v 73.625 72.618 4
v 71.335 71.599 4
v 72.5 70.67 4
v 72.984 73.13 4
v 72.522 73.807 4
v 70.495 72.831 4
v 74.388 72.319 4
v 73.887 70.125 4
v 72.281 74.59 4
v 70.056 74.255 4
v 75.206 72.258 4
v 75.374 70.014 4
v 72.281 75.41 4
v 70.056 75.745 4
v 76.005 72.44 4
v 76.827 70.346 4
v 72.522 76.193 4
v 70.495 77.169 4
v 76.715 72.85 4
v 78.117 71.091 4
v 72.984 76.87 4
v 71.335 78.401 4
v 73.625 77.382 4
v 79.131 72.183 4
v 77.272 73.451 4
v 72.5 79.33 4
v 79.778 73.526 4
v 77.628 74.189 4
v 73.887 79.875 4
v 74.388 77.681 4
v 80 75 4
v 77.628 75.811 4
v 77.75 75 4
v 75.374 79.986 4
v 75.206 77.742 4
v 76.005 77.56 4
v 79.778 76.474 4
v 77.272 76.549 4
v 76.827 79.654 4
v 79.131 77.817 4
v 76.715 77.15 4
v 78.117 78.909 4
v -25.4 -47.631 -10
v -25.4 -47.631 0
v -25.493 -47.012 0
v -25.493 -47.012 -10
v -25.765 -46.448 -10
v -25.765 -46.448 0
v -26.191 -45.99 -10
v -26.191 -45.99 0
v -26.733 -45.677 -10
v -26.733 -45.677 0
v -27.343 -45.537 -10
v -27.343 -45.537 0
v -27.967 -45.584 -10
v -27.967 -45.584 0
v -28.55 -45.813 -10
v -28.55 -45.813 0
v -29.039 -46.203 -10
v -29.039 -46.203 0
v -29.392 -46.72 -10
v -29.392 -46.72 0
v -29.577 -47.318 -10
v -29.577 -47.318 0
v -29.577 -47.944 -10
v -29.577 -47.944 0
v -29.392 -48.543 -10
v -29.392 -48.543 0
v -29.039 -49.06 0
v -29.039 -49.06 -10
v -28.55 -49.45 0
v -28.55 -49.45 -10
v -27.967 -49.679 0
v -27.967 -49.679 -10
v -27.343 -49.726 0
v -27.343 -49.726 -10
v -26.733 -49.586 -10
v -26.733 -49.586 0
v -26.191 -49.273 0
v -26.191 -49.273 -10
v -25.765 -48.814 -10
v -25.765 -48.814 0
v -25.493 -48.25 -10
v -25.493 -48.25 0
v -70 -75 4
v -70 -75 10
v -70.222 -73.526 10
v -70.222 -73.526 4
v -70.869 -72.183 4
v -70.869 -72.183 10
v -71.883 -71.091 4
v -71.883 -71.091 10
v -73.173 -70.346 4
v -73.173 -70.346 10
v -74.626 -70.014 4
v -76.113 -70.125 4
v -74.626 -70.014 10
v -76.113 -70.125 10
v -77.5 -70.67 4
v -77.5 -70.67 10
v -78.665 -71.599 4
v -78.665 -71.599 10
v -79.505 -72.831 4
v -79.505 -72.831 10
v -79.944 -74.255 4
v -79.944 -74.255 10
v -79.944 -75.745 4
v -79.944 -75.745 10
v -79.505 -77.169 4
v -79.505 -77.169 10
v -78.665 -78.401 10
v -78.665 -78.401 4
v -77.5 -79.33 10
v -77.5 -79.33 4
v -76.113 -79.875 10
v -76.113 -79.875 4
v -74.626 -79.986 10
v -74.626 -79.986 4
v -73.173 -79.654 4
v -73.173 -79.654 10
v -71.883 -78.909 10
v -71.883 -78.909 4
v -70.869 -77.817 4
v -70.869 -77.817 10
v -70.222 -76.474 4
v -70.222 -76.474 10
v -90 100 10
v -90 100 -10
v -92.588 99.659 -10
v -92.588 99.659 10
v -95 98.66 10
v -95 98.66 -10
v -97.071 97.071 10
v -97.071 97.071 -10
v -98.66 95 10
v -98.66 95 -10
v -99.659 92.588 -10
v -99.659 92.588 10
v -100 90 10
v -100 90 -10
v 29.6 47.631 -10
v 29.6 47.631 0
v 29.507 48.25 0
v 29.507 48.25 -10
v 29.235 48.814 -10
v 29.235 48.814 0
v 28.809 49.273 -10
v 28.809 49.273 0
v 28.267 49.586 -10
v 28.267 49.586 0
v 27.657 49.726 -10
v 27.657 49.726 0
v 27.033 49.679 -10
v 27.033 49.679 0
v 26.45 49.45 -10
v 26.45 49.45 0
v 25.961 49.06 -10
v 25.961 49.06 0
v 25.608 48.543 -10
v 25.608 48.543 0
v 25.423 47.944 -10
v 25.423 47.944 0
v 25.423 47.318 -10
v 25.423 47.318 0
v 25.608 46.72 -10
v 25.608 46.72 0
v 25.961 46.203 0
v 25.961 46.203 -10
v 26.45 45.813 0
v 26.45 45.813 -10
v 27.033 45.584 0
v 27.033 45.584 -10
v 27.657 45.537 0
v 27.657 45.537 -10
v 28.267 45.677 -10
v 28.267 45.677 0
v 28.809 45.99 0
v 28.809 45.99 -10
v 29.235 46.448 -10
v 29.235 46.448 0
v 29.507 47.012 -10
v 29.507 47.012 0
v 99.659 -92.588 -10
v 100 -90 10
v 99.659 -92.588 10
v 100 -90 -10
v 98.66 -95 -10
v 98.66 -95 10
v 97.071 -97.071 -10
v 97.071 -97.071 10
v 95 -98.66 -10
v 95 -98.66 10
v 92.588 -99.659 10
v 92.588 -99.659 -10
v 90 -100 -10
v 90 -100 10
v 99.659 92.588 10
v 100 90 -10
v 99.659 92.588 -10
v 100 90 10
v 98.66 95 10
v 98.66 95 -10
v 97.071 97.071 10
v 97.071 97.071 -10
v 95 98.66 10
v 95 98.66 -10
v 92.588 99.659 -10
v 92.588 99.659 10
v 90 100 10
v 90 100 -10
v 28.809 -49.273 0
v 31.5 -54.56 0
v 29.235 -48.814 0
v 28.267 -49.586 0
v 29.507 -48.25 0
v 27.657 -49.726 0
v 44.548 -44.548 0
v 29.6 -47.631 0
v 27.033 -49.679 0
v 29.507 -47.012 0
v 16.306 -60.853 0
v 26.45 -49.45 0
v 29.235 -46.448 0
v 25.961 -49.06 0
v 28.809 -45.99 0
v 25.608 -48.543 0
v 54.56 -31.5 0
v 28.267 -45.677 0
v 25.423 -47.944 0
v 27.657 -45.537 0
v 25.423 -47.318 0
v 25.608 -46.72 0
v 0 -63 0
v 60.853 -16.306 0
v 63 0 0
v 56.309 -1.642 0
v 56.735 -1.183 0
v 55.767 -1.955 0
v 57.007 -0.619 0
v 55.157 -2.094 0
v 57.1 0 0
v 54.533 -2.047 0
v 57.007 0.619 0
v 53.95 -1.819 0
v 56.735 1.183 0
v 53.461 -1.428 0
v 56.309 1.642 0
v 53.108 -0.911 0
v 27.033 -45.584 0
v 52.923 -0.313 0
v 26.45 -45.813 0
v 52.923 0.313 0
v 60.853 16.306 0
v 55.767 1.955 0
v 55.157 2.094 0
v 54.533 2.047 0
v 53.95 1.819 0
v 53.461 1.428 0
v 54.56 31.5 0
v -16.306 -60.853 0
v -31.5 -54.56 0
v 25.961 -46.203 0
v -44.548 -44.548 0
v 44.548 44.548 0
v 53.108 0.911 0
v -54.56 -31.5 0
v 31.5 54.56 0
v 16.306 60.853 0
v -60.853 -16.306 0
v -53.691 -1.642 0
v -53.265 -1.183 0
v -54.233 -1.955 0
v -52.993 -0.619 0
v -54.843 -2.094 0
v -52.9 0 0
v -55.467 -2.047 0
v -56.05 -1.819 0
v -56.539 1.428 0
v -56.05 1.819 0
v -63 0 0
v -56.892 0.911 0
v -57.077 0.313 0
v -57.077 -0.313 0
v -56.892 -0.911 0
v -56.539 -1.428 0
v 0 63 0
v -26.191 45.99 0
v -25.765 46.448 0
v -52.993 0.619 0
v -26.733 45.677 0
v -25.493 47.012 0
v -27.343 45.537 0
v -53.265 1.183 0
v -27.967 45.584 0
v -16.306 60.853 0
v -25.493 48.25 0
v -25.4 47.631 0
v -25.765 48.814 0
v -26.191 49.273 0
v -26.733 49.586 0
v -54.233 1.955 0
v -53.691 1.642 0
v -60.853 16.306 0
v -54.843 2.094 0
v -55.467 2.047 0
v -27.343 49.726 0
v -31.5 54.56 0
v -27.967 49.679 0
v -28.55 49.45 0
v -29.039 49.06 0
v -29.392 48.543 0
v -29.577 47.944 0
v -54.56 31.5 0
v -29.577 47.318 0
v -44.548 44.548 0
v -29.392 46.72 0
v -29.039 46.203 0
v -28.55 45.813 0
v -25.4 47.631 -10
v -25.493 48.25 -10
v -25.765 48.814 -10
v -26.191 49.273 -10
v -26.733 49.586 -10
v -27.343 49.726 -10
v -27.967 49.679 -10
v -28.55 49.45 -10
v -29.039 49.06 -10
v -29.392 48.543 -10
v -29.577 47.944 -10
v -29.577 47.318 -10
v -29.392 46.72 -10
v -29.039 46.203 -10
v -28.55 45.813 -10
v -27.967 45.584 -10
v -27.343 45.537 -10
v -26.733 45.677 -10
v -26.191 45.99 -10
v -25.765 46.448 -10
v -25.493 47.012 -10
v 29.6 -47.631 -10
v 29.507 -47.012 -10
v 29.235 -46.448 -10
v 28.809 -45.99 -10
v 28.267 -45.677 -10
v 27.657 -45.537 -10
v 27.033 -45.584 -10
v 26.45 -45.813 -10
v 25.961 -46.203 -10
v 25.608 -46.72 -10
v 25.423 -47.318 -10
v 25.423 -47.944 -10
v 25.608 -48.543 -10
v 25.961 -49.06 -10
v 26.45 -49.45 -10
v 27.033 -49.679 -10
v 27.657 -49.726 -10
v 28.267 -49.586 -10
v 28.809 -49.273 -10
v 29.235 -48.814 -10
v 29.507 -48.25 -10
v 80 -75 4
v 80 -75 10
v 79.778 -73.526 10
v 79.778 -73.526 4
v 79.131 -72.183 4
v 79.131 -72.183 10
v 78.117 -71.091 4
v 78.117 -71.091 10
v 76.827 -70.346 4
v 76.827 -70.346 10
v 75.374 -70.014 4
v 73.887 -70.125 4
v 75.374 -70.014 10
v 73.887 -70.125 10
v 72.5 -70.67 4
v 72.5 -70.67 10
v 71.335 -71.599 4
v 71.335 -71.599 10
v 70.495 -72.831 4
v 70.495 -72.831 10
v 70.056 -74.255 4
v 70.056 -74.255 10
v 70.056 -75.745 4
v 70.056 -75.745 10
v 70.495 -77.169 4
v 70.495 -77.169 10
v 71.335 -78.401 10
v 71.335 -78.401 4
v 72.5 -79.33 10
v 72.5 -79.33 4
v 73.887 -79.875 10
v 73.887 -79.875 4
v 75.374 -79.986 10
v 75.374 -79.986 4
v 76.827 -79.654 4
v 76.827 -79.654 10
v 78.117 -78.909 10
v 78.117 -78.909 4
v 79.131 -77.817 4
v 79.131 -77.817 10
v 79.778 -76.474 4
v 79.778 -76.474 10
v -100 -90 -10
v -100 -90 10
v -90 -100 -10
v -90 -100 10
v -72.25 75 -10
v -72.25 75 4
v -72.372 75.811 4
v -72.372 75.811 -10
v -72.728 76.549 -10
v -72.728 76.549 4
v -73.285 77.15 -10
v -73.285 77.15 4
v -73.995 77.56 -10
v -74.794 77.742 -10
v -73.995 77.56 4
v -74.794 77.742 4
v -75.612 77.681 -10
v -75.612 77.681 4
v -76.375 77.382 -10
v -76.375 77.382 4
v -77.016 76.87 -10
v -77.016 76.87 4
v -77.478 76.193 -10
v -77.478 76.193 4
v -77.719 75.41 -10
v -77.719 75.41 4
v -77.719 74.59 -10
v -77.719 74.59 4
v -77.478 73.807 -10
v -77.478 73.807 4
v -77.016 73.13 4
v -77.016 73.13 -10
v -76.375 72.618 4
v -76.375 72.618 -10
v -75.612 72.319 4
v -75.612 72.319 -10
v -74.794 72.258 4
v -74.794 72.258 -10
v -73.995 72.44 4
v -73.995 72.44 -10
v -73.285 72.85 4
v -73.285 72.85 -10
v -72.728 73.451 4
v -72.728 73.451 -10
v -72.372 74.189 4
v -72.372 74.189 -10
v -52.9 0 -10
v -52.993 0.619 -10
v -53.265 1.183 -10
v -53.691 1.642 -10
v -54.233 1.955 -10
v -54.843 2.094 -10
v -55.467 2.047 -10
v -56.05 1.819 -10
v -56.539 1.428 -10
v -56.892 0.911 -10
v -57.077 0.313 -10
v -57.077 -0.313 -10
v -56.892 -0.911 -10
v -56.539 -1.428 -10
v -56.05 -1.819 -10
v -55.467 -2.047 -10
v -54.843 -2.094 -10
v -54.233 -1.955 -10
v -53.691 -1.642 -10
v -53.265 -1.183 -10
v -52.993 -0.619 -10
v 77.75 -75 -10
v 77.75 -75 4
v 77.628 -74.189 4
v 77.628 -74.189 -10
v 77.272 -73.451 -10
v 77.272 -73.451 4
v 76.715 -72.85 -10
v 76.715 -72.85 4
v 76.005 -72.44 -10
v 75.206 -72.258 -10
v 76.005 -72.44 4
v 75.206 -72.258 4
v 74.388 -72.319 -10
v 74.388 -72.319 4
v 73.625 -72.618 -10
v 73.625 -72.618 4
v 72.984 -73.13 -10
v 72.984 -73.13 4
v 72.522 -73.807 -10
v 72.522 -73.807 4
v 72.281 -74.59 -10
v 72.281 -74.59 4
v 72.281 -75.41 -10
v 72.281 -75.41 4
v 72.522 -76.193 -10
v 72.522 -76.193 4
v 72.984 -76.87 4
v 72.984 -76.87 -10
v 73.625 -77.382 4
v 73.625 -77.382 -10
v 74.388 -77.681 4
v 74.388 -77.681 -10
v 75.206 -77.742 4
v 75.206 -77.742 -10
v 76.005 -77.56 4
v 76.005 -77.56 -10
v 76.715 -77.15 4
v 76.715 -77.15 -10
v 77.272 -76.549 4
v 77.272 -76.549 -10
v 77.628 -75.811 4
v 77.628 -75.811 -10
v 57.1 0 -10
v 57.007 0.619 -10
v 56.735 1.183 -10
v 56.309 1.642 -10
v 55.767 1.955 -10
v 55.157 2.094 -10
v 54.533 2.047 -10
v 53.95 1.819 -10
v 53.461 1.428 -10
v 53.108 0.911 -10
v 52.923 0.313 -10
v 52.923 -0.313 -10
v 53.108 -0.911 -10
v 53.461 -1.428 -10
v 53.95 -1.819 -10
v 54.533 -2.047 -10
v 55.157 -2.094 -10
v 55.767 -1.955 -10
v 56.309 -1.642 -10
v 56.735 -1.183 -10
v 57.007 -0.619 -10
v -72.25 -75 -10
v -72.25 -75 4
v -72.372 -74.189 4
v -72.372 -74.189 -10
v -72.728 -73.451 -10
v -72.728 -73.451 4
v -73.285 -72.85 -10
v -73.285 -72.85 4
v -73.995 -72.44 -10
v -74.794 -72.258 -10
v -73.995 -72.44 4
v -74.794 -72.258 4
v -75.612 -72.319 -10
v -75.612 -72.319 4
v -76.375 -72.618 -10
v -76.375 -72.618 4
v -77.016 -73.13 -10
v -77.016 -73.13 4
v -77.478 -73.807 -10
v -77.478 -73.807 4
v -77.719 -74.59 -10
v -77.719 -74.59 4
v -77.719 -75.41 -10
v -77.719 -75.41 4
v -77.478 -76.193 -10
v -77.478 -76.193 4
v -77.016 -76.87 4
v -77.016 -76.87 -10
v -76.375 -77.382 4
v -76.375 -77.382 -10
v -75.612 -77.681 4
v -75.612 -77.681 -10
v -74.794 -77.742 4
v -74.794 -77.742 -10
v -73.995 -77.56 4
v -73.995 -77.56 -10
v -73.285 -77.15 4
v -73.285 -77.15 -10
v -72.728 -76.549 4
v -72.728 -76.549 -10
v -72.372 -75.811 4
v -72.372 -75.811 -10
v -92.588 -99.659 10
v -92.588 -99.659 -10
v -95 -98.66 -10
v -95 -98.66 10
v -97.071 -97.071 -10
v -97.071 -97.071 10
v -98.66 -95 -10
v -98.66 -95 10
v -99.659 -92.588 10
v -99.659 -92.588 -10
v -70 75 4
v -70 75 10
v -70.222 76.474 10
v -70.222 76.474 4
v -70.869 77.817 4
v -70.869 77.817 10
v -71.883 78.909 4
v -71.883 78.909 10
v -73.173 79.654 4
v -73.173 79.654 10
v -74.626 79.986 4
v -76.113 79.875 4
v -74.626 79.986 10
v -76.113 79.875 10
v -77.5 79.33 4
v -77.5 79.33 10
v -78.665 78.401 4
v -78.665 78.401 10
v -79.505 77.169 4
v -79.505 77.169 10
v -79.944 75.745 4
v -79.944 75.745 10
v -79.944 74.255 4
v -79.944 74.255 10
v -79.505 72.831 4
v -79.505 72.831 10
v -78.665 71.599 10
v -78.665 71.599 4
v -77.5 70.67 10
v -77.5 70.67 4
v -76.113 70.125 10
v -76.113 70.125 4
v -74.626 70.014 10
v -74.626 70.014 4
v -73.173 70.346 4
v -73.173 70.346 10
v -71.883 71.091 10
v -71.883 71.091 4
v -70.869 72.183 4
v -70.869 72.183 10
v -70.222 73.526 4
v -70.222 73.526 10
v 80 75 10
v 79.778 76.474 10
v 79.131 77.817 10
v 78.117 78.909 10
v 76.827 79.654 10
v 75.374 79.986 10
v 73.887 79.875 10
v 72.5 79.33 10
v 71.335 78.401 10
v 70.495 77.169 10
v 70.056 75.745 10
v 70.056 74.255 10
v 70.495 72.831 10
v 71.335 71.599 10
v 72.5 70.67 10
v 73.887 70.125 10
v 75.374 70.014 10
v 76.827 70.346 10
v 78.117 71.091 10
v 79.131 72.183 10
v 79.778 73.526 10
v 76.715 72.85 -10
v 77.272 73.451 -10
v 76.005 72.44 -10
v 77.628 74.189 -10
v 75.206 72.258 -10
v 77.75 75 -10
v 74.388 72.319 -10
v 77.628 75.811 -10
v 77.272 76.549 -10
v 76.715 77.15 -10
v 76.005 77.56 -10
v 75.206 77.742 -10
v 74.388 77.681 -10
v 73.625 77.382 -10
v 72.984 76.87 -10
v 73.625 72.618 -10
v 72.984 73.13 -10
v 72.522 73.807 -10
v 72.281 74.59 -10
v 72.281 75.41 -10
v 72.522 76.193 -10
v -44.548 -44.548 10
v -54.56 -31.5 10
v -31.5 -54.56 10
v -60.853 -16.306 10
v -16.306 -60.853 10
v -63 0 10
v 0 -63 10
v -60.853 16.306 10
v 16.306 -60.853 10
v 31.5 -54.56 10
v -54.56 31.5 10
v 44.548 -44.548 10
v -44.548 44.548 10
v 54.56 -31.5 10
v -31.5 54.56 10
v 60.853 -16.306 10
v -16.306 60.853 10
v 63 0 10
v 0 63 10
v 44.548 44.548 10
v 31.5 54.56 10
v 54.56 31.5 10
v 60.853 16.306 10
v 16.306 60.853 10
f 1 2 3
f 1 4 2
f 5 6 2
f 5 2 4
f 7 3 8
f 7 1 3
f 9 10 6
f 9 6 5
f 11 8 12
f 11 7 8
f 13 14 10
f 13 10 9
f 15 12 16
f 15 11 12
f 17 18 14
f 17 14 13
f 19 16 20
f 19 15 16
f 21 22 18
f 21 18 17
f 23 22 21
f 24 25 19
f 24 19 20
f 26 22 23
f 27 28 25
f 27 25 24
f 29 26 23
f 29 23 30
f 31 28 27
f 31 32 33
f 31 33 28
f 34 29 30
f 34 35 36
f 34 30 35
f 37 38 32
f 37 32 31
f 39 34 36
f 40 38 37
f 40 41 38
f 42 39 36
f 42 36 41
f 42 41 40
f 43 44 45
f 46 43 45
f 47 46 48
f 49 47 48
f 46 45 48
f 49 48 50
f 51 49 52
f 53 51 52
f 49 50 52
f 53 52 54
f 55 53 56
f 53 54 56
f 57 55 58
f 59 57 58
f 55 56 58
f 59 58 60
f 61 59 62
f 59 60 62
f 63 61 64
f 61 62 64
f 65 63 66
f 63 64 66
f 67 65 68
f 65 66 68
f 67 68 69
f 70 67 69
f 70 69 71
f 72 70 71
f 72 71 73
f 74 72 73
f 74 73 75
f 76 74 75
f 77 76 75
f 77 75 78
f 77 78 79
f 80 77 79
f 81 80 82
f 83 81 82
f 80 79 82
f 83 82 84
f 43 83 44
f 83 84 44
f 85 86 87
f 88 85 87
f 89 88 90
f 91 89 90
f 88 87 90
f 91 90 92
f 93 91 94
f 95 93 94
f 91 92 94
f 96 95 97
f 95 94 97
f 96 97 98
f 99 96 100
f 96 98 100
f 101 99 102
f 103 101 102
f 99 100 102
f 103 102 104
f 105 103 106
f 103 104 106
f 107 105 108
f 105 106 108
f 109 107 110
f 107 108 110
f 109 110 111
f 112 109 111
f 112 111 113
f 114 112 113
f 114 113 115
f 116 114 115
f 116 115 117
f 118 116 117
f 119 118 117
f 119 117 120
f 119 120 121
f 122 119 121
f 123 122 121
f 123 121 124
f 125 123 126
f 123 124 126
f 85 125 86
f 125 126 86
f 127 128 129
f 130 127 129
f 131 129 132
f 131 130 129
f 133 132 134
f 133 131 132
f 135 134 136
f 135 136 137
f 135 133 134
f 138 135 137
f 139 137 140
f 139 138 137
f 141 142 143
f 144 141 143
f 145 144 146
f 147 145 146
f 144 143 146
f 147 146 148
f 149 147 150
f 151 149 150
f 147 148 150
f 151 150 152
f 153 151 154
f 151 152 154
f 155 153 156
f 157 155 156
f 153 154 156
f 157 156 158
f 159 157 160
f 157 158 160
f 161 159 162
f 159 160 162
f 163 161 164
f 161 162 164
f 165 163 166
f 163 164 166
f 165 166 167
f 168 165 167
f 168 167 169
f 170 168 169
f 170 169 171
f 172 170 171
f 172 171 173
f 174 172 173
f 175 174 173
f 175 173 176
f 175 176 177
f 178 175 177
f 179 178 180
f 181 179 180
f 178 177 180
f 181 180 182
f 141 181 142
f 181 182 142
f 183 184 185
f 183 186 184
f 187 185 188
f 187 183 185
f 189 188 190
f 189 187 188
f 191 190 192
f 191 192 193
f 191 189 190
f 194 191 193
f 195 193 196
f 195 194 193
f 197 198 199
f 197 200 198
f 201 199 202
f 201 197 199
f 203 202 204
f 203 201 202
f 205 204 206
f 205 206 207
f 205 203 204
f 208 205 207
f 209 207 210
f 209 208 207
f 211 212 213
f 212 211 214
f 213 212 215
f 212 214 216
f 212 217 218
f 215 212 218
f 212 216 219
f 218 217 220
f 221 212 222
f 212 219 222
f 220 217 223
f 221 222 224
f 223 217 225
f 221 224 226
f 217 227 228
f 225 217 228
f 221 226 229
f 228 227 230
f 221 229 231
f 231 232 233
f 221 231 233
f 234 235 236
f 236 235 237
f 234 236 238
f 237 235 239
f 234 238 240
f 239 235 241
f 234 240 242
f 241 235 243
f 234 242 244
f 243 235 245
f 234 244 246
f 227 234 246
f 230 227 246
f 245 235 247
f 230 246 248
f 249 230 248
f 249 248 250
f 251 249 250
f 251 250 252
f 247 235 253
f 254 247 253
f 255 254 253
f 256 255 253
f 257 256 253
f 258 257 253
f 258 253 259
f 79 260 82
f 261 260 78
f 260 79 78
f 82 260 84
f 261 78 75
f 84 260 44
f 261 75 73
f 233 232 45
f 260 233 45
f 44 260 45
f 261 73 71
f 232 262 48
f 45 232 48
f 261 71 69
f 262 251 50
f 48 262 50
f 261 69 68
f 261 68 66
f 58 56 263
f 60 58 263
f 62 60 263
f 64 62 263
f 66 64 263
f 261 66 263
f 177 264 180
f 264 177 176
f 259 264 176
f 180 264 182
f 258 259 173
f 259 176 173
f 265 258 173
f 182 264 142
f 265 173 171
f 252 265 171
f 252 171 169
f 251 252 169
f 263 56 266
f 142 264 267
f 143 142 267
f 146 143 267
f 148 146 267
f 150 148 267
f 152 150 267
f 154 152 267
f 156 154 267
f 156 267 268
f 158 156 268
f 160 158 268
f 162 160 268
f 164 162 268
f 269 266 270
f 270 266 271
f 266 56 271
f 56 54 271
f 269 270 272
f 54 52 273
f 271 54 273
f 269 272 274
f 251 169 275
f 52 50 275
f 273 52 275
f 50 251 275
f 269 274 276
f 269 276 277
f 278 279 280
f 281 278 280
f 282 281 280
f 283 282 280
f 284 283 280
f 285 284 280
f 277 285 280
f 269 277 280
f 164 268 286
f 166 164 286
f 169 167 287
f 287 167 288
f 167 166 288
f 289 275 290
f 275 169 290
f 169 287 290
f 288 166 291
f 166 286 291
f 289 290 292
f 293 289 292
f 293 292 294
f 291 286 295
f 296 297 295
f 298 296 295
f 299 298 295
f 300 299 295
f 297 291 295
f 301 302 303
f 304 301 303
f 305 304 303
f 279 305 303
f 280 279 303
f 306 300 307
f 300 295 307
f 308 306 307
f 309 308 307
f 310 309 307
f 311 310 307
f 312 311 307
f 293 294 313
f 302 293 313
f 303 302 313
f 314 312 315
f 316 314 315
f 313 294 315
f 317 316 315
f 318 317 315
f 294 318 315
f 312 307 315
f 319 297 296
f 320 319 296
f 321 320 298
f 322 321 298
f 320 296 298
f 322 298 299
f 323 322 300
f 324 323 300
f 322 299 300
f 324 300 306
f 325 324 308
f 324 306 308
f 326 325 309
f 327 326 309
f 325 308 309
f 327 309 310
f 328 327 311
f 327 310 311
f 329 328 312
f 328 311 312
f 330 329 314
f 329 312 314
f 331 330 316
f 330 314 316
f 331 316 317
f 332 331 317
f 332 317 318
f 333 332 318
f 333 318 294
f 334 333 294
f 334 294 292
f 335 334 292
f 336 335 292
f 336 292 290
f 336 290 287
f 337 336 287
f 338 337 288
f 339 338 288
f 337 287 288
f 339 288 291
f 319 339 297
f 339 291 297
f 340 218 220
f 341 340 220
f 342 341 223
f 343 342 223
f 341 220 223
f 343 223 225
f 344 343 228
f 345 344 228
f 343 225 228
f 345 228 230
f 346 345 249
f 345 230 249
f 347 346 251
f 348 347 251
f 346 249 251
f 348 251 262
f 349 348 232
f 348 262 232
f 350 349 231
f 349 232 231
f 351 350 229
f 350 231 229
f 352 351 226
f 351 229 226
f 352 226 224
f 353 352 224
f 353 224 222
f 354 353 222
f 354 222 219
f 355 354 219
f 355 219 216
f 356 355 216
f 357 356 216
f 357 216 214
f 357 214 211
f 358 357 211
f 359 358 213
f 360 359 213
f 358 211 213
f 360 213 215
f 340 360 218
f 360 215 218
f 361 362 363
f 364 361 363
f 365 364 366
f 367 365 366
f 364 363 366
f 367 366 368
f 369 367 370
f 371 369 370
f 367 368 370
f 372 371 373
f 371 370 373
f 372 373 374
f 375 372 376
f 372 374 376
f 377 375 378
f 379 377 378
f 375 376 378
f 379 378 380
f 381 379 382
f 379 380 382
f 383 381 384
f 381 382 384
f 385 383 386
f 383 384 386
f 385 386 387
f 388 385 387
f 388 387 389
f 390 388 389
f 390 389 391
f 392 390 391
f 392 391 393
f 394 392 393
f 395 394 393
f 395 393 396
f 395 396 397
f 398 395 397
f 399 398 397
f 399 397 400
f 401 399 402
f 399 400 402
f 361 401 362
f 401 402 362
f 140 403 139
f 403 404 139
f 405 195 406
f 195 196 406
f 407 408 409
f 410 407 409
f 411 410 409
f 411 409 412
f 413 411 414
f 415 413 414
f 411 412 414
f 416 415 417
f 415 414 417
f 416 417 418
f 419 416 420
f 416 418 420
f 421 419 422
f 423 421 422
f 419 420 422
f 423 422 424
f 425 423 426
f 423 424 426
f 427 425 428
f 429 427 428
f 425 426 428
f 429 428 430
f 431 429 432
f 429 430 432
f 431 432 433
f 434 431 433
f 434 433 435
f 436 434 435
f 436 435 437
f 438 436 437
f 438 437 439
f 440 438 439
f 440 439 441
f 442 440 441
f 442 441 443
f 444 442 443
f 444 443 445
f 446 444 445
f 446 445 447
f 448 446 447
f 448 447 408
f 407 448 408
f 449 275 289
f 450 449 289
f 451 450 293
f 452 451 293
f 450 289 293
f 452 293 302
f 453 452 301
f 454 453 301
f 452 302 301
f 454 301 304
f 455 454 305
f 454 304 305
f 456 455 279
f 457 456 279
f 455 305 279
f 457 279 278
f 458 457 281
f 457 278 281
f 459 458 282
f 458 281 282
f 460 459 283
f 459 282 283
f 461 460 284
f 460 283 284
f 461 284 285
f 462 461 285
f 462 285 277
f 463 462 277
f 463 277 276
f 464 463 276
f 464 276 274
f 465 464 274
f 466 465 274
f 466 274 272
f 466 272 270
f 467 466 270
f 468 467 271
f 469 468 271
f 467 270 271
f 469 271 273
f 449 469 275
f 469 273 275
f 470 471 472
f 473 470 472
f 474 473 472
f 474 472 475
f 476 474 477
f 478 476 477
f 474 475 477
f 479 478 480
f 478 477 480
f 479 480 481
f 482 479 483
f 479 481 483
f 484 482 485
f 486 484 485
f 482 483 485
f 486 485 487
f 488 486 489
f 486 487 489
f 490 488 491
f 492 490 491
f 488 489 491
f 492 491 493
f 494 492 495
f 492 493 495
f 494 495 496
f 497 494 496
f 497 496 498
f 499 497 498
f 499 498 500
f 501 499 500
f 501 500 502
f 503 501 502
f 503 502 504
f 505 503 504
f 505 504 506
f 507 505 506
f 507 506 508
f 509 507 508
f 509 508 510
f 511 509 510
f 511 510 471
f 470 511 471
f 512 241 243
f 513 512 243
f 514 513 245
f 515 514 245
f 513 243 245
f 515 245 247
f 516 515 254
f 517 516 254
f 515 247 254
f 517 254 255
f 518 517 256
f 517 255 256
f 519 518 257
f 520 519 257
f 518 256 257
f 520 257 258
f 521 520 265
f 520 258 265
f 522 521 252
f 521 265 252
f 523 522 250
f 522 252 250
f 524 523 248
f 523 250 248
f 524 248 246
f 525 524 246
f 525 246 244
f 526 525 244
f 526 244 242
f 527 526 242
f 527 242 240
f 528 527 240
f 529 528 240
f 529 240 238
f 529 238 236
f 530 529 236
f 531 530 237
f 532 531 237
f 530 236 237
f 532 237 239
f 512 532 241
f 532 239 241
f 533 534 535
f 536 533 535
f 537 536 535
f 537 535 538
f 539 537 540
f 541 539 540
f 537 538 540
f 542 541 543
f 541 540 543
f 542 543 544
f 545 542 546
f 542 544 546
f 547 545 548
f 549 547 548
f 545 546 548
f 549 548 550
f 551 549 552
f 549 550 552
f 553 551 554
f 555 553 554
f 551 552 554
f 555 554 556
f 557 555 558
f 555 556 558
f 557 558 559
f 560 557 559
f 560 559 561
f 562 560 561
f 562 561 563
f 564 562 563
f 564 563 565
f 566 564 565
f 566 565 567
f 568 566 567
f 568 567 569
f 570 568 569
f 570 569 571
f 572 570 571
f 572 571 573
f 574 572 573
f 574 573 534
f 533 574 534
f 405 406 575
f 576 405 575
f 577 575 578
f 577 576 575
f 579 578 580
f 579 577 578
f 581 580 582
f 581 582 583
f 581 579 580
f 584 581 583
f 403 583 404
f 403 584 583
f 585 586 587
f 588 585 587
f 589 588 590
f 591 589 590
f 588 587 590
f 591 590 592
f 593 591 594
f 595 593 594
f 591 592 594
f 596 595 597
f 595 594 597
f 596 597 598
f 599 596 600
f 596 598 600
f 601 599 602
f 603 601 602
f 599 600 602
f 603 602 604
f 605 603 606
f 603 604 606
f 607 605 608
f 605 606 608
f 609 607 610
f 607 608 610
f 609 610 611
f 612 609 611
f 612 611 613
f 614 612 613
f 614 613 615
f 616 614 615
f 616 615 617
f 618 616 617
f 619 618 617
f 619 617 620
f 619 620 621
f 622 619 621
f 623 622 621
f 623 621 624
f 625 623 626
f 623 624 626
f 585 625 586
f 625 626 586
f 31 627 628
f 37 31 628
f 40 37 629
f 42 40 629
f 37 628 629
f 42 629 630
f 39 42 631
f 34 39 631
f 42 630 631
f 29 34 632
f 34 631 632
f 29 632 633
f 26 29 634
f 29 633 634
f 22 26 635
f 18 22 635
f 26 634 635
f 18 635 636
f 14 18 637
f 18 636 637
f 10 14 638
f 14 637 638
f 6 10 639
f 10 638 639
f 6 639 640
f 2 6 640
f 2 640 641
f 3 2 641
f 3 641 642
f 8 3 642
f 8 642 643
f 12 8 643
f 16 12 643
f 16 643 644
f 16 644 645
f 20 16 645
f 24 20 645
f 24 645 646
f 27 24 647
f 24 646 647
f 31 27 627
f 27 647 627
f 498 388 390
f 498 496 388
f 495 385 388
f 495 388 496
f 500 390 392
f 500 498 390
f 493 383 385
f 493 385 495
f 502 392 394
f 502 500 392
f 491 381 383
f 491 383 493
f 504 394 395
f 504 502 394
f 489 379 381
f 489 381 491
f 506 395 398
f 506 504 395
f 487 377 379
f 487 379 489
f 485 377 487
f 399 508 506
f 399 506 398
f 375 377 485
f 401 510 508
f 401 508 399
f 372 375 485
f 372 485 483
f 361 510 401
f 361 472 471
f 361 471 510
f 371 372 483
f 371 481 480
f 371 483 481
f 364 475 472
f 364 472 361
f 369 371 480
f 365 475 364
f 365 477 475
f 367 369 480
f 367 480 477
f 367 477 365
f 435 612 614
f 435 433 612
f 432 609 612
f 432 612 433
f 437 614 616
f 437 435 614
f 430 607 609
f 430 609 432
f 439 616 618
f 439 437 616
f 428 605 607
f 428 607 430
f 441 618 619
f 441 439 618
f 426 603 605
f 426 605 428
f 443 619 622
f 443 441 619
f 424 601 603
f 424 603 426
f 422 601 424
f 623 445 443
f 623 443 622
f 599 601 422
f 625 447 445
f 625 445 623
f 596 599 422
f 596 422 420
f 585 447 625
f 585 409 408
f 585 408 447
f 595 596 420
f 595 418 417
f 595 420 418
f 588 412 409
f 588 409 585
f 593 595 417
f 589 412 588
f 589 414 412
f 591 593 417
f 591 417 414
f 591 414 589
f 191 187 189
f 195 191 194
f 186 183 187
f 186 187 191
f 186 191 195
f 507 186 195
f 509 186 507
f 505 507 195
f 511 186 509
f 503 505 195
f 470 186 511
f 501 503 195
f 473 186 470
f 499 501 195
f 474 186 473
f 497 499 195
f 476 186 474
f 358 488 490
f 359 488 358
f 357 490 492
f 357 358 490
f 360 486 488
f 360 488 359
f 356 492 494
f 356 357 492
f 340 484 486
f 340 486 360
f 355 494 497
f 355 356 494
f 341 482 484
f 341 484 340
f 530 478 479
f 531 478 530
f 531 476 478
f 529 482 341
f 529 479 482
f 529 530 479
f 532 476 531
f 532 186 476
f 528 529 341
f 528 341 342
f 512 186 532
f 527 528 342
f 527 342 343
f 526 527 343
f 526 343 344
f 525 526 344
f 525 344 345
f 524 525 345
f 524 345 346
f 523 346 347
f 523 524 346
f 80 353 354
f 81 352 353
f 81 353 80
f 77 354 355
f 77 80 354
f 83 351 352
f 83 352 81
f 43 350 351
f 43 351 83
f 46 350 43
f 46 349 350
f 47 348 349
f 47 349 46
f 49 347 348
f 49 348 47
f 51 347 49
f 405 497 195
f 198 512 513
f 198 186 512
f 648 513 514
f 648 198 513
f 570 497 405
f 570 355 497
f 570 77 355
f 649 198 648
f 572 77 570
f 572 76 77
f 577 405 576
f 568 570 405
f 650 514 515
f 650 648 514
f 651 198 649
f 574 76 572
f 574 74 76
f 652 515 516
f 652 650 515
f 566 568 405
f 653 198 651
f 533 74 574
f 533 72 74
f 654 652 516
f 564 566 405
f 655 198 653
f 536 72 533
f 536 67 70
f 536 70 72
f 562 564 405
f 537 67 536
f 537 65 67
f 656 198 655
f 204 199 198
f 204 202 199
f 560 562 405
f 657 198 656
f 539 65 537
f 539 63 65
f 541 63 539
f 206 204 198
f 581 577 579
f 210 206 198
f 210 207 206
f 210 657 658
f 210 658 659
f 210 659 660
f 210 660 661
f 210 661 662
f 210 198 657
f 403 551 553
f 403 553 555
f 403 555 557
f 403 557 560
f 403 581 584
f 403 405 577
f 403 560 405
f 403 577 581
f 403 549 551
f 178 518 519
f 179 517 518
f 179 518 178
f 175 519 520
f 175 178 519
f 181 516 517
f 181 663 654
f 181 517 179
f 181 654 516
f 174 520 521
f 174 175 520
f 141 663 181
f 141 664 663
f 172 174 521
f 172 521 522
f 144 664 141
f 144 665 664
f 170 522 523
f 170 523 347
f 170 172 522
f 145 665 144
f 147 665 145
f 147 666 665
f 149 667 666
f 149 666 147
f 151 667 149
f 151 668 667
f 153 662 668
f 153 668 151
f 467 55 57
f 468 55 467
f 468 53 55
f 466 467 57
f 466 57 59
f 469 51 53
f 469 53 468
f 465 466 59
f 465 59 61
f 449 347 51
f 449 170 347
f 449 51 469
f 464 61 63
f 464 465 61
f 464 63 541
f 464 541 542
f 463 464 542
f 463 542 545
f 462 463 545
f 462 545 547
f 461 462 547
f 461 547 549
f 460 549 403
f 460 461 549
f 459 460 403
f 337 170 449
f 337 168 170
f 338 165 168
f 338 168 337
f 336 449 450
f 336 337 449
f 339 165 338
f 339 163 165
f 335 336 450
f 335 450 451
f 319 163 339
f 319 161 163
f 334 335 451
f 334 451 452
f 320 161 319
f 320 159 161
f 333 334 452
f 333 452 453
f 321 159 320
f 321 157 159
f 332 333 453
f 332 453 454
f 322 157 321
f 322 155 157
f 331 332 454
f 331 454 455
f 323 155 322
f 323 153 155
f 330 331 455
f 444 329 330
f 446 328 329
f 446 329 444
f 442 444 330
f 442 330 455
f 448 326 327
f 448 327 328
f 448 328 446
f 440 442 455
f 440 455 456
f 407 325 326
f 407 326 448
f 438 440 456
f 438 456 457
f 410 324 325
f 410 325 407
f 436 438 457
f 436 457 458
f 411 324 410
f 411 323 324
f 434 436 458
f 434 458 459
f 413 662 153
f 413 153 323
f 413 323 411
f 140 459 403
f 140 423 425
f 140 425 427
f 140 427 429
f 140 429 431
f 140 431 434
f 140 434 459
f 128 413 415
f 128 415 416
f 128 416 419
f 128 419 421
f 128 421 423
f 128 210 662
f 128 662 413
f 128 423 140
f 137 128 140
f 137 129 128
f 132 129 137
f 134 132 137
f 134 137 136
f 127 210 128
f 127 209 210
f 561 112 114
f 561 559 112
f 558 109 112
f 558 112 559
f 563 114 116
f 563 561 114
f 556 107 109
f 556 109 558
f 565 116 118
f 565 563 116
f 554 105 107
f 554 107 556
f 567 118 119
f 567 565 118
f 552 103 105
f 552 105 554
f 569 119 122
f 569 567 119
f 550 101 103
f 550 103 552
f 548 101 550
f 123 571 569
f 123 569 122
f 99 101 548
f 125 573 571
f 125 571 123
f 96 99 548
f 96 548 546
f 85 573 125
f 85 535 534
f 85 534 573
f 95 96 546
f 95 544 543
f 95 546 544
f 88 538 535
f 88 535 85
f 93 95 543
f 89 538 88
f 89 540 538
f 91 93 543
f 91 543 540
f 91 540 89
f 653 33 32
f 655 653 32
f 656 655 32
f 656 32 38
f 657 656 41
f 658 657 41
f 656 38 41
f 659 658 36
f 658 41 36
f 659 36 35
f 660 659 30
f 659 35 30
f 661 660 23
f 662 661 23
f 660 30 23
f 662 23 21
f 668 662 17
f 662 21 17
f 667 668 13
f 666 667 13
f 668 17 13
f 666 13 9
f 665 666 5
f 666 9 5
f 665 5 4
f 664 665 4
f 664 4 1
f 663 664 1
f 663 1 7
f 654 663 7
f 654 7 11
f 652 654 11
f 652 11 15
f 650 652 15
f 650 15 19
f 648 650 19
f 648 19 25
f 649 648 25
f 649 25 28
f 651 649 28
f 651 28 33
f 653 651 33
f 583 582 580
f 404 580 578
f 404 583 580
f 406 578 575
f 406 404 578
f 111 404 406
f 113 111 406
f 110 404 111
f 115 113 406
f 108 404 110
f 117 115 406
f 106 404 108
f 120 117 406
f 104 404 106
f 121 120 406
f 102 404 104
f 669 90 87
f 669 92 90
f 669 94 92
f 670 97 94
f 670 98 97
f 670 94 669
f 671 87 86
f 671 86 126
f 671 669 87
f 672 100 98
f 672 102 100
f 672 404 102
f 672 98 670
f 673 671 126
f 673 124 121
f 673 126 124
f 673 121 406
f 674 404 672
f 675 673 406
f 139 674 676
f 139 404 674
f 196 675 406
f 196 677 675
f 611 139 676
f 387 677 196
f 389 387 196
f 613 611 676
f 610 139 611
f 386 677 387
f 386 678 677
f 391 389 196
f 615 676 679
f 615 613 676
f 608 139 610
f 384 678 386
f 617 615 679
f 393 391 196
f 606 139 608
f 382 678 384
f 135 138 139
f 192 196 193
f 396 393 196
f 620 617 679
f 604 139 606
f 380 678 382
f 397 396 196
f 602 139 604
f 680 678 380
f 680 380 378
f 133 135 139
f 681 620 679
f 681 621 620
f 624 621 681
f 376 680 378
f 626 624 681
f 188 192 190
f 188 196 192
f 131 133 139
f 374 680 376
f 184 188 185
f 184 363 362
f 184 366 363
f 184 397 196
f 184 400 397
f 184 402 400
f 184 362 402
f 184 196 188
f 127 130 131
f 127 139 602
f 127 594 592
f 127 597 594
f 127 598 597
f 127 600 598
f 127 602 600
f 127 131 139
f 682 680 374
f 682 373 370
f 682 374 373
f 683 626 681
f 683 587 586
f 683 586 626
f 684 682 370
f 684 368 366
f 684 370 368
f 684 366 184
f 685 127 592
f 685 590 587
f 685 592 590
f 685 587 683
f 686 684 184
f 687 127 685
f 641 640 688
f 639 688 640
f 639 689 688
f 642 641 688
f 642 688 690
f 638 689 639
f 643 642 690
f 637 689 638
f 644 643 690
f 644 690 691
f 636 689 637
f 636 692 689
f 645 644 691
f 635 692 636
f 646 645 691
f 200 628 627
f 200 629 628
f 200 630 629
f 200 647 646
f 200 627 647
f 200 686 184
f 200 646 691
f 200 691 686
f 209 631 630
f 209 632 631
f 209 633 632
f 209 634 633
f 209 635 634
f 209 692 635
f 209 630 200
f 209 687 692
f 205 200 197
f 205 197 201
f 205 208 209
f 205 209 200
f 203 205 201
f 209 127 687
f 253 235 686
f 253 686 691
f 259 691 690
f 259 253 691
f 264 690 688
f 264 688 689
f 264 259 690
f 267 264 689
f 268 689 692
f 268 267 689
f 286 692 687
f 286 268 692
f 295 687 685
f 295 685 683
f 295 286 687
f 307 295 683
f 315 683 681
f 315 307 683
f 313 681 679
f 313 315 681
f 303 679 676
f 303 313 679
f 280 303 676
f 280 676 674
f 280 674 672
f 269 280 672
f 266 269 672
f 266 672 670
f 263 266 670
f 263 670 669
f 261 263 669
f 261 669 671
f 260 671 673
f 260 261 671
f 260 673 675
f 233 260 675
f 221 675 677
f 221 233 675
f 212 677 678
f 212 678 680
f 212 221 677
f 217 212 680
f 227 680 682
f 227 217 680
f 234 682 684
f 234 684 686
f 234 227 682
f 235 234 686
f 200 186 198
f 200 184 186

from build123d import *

# Parameters (mm, degrees)
SKETCH_1_W          = 200
SKETCH_1_H          = 200
SKETCH_1_R          = 63
EXTRUDE_1_DEPTH     = 10
SKETCH_2_W          = 200
SKETCH_2_H          = 200
EXTRUDE_2_DEPTH     = 10
SKETCH_3_R          = 2.1
CUT_EXTRUDE_1_DEPTH = 10
SKETCH_4_R          = 2.75
CUT_EXTRUDE_2_DEPTH = 143.828568571
SKETCH_5_R          = 5
CUT_EXTRUDE_3_DEPTH = 6
FILLET_1_R          = 10


with BuildPart() as part:
    # ｽｹｯﾁ1 → ﾎﾞｽ - 押し出し1 (new body)
    with BuildSketch(Plane.XY):
        Rectangle(SKETCH_1_W, SKETCH_1_H)
        Circle(SKETCH_1_R, mode=Mode.SUBTRACT)
    extrude(amount=EXTRUDE_1_DEPTH)

    # ｽｹｯﾁ2 → ﾎﾞｽ - 押し出し2 (add)
    with BuildSketch(Plane(origin=(0, 0, 0), x_dir=(-1, 0, 0), z_dir=(0, 0, -1))):
        Rectangle(SKETCH_2_W, SKETCH_2_H)
    extrude(amount=EXTRUDE_2_DEPTH)

    # ｽｹｯﾁ3 → ｶｯﾄ - 押し出し1 (cut)
    with BuildSketch(Plane.XY):
        with Locations((27.5, -47.631397208)):
            Circle(SKETCH_3_R)
        with Locations((-27.5, -47.631397208)):
            Circle(SKETCH_3_R)
        with Locations((-55, 0)):
            Circle(SKETCH_3_R)
        with Locations((-27.5, 47.631397208)):
            Circle(SKETCH_3_R)
        with Locations((27.5, 47.631397208)):
            Circle(SKETCH_3_R)
        with Locations((55, 0)):
            Circle(SKETCH_3_R)
    extrude(amount=-CUT_EXTRUDE_1_DEPTH, mode=Mode.SUBTRACT)

    # ｽｹｯﾁ4 → ｶｯﾄ - 押し出し2 (cut, through all)
    with BuildSketch(Plane.XY.offset(10)):
        with Locations((75, 75)):
            Circle(SKETCH_4_R)
        with Locations((75, -75)):
            Circle(SKETCH_4_R)
        with Locations((-75, -75)):
            Circle(SKETCH_4_R)
        with Locations((-75, 75)):
            Circle(SKETCH_4_R)
    extrude(amount=-CUT_EXTRUDE_2_DEPTH, mode=Mode.SUBTRACT)

    # ｽｹｯﾁ5 → ｶｯﾄ - 押し出し3 (cut)
    with BuildSketch(Plane.XY.offset(10)):
        with Locations((75, -75)):
            Circle(SKETCH_5_R)
        with Locations((-75, -75)):
            Circle(SKETCH_5_R)
        with Locations((-75, 75)):
            Circle(SKETCH_5_R)
        with Locations((75, 75)):
            Circle(SKETCH_5_R)
    extrude(amount=-CUT_EXTRUDE_3_DEPTH, mode=Mode.SUBTRACT)

    # ﾌｨﾚｯﾄ1
    fillet_1_edges = [part.edges().sort_by_distance(p)[0] for p in [
        (100, -100, 0),
        (-100, -100, 0),
        (-100, 100, 0),
        (100, 100, 0),
    ]]
    fillet(fillet_1_edges, radius=FILLET_1_R)


solid = part.part
